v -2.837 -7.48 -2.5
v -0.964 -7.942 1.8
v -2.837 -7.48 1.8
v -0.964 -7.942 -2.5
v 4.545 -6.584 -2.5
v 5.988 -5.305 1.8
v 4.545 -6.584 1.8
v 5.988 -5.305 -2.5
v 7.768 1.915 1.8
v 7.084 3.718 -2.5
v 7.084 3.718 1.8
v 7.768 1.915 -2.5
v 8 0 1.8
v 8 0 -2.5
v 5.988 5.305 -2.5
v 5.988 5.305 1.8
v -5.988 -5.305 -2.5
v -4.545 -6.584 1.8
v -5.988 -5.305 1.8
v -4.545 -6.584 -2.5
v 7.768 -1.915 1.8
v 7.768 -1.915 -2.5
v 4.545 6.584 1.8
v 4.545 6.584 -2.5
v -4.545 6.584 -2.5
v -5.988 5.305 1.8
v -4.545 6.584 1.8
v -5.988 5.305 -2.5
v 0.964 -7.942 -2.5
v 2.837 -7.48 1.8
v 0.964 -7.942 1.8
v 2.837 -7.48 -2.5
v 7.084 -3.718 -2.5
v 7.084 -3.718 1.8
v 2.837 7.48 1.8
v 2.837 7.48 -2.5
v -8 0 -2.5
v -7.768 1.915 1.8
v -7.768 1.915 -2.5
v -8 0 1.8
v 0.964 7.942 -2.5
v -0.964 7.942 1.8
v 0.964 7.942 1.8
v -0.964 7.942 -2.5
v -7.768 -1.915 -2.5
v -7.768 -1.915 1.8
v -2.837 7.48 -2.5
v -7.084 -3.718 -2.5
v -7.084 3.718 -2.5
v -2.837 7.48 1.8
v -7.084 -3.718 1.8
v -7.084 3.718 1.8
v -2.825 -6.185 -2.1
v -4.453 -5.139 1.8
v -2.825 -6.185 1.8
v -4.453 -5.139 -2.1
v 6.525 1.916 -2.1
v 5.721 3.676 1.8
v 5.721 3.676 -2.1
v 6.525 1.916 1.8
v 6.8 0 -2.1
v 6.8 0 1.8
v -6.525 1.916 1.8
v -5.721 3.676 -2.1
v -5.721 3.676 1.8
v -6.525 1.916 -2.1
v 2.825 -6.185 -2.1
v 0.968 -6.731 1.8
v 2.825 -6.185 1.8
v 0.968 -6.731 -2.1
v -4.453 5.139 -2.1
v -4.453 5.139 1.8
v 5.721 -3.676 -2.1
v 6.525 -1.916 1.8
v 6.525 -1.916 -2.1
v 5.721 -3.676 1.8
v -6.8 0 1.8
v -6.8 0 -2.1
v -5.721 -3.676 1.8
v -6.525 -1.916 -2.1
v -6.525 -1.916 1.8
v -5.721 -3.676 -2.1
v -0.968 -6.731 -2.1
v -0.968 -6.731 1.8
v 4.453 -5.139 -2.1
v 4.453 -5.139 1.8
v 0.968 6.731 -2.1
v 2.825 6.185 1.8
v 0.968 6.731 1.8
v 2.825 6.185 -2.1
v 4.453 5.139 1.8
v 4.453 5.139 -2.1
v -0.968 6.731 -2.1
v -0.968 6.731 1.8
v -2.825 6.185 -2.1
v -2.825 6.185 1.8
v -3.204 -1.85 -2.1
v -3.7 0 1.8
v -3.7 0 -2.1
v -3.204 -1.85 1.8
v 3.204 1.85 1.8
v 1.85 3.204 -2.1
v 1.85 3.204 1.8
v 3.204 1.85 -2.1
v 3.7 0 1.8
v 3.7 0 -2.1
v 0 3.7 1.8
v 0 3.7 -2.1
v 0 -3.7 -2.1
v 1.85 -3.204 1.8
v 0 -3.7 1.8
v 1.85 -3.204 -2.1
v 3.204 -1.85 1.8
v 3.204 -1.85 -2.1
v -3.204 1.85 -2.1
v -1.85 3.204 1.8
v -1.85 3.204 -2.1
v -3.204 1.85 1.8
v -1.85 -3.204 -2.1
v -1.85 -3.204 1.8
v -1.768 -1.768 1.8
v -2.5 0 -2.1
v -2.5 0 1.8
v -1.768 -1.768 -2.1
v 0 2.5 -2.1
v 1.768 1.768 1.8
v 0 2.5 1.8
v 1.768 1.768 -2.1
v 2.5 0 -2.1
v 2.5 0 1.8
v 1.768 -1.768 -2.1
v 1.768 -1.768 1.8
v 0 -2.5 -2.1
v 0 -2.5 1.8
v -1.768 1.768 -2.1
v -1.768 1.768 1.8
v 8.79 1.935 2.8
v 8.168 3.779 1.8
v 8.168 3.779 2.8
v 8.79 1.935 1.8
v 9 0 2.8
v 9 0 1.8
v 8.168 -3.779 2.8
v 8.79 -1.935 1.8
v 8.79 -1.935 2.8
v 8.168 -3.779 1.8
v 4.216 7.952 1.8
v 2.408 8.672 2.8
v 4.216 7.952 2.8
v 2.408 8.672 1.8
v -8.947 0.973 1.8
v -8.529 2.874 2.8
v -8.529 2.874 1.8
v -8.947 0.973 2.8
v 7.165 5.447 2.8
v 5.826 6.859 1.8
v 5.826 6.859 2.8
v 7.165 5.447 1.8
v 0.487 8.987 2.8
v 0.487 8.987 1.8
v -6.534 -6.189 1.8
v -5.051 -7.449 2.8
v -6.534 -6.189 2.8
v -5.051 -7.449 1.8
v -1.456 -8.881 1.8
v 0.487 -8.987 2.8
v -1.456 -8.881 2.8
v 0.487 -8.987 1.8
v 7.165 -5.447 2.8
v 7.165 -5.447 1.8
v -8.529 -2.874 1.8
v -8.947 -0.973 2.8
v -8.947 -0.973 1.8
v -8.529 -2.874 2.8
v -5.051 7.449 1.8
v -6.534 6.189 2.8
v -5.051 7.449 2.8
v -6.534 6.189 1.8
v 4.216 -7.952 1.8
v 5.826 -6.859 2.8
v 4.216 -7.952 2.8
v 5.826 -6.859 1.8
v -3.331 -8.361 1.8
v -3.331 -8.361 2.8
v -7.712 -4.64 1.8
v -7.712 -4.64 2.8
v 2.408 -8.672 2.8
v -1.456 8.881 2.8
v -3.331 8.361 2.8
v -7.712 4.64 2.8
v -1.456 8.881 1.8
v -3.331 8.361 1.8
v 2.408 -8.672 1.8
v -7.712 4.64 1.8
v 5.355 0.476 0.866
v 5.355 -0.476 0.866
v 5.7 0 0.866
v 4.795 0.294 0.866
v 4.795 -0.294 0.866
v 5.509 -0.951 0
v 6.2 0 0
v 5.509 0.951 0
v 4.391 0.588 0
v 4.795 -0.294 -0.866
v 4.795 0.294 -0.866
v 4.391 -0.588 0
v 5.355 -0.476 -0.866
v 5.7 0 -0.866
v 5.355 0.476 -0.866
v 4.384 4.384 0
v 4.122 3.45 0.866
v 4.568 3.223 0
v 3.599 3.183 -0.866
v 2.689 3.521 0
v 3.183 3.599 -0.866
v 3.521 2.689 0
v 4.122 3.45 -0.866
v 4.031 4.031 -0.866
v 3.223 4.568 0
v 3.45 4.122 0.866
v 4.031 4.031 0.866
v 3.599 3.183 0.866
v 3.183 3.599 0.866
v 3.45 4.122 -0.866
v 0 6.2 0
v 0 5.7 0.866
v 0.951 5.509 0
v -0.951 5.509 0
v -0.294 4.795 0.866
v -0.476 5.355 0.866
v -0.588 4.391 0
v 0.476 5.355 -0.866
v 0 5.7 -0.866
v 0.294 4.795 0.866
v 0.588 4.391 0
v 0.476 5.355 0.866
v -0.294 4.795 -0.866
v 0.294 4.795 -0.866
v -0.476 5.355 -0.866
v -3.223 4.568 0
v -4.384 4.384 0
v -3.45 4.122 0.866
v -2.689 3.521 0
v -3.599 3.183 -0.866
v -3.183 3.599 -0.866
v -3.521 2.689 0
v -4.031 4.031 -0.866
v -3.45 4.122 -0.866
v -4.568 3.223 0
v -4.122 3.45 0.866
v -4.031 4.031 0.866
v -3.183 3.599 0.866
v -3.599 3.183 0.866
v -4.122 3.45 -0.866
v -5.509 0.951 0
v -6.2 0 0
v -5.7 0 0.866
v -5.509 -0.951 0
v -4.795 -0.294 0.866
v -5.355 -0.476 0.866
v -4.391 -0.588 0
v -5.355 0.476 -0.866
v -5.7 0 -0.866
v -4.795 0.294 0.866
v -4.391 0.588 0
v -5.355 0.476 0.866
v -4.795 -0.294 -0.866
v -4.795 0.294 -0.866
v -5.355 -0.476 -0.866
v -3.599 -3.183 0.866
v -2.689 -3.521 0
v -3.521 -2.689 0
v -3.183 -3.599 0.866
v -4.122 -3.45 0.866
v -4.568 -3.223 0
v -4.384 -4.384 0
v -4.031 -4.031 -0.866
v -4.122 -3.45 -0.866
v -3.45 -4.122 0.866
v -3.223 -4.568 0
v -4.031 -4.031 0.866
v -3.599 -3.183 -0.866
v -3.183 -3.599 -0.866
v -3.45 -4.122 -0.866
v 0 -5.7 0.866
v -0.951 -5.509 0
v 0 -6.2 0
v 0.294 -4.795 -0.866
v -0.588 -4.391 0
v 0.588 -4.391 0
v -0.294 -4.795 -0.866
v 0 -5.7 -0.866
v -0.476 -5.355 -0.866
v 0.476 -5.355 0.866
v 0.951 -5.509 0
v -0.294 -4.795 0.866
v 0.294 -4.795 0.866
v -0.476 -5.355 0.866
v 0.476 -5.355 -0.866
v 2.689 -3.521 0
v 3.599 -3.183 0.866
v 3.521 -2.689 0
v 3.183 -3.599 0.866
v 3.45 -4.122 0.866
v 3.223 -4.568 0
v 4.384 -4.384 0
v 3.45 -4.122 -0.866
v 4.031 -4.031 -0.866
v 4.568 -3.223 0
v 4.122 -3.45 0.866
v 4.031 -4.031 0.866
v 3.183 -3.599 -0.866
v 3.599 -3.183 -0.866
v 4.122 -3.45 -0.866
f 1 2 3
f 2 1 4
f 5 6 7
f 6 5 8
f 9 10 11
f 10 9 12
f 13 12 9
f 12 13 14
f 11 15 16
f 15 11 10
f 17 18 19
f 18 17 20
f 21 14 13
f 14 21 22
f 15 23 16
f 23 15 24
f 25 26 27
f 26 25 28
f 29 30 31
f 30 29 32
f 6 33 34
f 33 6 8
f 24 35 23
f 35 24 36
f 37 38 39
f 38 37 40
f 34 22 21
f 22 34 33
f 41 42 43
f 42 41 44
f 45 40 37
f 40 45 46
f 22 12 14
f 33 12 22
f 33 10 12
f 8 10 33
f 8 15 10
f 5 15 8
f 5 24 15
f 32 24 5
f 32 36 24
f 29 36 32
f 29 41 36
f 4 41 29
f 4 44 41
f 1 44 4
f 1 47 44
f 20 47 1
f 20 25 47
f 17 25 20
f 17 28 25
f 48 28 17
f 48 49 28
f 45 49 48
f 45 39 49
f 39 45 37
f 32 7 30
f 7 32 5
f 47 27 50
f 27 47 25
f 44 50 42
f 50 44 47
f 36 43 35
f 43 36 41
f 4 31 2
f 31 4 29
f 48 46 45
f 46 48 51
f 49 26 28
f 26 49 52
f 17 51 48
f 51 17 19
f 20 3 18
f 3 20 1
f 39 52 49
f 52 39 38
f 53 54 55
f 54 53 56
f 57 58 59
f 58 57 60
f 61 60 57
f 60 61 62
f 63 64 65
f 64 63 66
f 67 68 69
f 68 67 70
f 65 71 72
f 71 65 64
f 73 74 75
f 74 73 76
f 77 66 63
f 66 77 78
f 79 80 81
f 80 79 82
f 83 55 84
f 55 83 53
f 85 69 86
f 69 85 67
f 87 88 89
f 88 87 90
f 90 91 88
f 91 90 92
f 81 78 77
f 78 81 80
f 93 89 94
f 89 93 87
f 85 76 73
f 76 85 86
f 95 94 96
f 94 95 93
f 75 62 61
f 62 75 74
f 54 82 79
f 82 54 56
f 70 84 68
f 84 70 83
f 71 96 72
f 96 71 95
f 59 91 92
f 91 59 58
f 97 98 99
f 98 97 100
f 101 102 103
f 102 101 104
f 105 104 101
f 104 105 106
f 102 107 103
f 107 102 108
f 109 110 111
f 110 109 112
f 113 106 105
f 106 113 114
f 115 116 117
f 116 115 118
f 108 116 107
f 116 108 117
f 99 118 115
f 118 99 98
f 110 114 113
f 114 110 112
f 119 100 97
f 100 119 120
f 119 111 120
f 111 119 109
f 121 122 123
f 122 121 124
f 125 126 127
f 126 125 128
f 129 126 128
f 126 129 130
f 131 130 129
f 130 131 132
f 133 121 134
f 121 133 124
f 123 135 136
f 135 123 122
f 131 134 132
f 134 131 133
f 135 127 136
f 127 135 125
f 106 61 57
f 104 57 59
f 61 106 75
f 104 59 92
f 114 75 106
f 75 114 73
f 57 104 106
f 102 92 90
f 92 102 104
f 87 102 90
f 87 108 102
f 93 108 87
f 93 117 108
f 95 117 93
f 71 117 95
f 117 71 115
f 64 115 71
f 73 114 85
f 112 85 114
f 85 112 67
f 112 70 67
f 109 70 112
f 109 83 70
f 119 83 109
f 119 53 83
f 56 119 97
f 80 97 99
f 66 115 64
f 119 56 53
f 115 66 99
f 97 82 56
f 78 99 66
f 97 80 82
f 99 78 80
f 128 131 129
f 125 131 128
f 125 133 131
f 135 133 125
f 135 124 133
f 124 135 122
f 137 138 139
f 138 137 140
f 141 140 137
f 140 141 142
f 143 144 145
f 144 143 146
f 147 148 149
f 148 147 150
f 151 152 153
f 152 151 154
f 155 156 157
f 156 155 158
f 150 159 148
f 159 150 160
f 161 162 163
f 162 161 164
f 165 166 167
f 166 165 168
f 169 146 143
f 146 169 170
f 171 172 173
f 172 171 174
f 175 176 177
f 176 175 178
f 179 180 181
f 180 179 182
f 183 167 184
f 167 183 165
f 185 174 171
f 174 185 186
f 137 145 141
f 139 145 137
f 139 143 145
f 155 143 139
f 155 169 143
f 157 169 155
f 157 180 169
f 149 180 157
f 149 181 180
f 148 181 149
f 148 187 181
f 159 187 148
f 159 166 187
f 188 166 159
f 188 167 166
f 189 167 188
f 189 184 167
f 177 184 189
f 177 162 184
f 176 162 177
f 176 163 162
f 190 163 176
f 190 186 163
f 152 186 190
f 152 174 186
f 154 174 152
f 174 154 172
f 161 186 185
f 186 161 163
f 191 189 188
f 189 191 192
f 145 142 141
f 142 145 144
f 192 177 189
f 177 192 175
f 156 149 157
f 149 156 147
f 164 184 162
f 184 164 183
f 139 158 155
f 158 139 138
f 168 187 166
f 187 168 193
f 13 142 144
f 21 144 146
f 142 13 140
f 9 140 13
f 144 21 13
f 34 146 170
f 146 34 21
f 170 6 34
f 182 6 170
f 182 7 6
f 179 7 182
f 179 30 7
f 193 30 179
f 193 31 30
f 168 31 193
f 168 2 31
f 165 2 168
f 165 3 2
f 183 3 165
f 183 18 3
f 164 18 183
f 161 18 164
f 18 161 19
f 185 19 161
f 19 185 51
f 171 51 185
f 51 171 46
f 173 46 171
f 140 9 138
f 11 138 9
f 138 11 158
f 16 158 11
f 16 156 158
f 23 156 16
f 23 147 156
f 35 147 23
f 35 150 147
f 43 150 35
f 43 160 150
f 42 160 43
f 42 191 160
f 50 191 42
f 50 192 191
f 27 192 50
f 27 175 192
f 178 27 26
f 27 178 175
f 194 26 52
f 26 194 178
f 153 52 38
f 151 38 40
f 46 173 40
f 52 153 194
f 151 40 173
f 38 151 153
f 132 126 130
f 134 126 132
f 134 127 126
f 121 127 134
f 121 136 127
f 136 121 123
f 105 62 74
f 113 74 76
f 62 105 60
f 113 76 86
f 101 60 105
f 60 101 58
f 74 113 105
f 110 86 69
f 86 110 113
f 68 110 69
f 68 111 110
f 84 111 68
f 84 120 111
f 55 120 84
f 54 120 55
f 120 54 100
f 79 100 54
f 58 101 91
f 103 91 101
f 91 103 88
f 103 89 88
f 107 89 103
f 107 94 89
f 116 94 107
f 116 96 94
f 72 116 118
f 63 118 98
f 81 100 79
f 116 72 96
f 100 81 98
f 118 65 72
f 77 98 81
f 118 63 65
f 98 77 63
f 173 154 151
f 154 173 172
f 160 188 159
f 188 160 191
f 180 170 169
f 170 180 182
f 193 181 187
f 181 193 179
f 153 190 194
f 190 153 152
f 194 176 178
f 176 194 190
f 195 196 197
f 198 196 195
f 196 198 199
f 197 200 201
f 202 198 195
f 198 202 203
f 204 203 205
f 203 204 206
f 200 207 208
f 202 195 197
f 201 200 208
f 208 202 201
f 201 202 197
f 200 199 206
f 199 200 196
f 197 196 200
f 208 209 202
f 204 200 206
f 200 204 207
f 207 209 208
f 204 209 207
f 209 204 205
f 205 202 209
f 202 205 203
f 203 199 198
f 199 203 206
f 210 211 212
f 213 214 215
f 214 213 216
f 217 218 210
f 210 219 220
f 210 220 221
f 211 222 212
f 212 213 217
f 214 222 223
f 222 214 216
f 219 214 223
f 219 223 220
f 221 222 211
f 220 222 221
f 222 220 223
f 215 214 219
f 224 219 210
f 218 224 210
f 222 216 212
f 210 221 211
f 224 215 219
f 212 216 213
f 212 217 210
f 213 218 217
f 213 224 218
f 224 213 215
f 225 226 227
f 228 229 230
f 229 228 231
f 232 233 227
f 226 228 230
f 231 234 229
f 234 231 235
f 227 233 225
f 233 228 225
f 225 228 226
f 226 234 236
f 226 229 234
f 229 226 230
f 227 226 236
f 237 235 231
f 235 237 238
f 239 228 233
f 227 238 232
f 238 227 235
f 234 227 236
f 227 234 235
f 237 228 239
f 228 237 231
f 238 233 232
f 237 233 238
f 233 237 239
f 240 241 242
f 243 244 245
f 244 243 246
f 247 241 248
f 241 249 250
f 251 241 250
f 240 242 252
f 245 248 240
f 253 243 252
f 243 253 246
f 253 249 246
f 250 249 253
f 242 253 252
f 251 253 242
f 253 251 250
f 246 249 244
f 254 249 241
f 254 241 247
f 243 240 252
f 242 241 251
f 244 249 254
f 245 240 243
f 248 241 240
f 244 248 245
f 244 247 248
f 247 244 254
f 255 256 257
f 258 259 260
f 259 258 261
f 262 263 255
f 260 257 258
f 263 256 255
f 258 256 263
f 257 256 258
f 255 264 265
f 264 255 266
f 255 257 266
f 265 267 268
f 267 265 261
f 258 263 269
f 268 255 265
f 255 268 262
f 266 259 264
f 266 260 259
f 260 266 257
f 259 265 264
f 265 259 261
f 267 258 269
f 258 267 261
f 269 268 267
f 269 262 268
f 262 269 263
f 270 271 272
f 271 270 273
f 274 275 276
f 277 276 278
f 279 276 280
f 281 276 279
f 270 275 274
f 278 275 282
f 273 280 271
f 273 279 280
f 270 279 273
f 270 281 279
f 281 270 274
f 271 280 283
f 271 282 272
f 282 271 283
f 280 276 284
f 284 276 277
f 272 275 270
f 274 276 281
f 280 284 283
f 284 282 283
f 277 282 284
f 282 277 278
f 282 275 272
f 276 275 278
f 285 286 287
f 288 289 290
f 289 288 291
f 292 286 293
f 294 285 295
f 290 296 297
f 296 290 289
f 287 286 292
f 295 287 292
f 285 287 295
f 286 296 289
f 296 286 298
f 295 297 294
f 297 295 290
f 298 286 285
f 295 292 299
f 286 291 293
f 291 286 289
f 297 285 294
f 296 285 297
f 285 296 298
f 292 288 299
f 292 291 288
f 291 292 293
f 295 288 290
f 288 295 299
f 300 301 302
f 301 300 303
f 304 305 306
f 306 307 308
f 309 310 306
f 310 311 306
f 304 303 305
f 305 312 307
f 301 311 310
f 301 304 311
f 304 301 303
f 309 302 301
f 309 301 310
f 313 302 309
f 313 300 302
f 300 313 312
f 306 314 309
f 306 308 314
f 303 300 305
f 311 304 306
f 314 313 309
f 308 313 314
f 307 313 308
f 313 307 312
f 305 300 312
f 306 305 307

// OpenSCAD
// Parameters
bore_diameter_mm = 5; //[2.5:10:0.1]
outer_diameter_mm = 16; //[8:32:0.1]
width_mm = 5; //[2.5:10:0.1]
flange_diameter_mm = 18; //[9:36:0.1]
flange_width_mm = 1; //[0.5:3:0.1]
outer_rim_radial_mm = 1.2; //[0.6:2.4:0.1]
inner_hub_radial_mm = 1.2; //[0.6:2.4:0.1]
race_chamfer_mm = 0.4; //[0.2:1:0.05]
ball_diameter_mm = 2.0; //[1.2:3.5:0.1]
ball_count = 8; //[6:14:1]
ball_track_radius_mm = 5.2; //[3.5:7.5:0.1]
eps_mm = 0.6; //[0.2:1.5:0.1]

// Bearing Ball - complete geometry
module bearing_ball() {
  color("Silver") {
    sphere(r=ball_diameter_mm/2);
  }
}

// Ball Bearing - complete geometry
module ball_bearing() {
  color("DimGray") {
    // Outer race
    difference() {
      cylinder(r=outer_diameter_mm/2, h=width_mm, center=true);
      cylinder(r=outer_diameter_mm/2 - outer_rim_radial_mm, h=width_mm + 2*eps_mm, center=true);
    }
    
    // Inner race
    difference() {
      cylinder(r=bore_diameter_mm/2 + inner_hub_radial_mm, h=width_mm, center=true);
      cylinder(r=bore_diameter_mm/2, h=width_mm + 2*eps_mm, center=true);
    }
    
    // Flange
    translate([0, 0, width_mm/2 - flange_width_mm/2 + eps_mm/2])
      cylinder(r=flange_diameter_mm/2, h=flange_width_mm, center=true);
    
    // Chamfers
    union() {
      translate([0, 0, width_mm/2 - race_chamfer_mm/2])
        cylinder(r1=outer_diameter_mm/2, r2=outer_diameter_mm/2 - race_chamfer_mm, h=race_chamfer_mm, center=true);
      translate([0, 0, -width_mm/2 + race_chamfer_mm/2])
        cylinder(r1=outer_diameter_mm/2, r2=outer_diameter_mm/2 - race_chamfer_mm, h=race_chamfer_mm, center=true);
      translate([0, 0, width_mm/2 - race_chamfer_mm/2])
        cylinder(r1=bore_diameter_mm/2 + inner_hub_radial_mm, r2=bore_diameter_mm/2 + inner_hub_radial_mm - race_chamfer_mm, h=race_chamfer_mm, center=true);
      translate([0, 0, -width_mm/2 + race_chamfer_mm/2])
        cylinder(r1=bore_diameter_mm/2 + inner_hub_radial_mm, r2=bore_diameter_mm/2 + inner_hub_radial_mm - race_chamfer_mm, h=race_chamfer_mm, center=true);
    }
  }
  
  // Bearing Balls
  for (i = [0:ball_count-1]) {
    rotate([0, 0, i*360/ball_count])
      translate([ball_track_radius_mm, 0, 0])
        bearing_ball();
  }
}

// Assembly
module assembly() {
  ball_bearing();
}

assembly();
